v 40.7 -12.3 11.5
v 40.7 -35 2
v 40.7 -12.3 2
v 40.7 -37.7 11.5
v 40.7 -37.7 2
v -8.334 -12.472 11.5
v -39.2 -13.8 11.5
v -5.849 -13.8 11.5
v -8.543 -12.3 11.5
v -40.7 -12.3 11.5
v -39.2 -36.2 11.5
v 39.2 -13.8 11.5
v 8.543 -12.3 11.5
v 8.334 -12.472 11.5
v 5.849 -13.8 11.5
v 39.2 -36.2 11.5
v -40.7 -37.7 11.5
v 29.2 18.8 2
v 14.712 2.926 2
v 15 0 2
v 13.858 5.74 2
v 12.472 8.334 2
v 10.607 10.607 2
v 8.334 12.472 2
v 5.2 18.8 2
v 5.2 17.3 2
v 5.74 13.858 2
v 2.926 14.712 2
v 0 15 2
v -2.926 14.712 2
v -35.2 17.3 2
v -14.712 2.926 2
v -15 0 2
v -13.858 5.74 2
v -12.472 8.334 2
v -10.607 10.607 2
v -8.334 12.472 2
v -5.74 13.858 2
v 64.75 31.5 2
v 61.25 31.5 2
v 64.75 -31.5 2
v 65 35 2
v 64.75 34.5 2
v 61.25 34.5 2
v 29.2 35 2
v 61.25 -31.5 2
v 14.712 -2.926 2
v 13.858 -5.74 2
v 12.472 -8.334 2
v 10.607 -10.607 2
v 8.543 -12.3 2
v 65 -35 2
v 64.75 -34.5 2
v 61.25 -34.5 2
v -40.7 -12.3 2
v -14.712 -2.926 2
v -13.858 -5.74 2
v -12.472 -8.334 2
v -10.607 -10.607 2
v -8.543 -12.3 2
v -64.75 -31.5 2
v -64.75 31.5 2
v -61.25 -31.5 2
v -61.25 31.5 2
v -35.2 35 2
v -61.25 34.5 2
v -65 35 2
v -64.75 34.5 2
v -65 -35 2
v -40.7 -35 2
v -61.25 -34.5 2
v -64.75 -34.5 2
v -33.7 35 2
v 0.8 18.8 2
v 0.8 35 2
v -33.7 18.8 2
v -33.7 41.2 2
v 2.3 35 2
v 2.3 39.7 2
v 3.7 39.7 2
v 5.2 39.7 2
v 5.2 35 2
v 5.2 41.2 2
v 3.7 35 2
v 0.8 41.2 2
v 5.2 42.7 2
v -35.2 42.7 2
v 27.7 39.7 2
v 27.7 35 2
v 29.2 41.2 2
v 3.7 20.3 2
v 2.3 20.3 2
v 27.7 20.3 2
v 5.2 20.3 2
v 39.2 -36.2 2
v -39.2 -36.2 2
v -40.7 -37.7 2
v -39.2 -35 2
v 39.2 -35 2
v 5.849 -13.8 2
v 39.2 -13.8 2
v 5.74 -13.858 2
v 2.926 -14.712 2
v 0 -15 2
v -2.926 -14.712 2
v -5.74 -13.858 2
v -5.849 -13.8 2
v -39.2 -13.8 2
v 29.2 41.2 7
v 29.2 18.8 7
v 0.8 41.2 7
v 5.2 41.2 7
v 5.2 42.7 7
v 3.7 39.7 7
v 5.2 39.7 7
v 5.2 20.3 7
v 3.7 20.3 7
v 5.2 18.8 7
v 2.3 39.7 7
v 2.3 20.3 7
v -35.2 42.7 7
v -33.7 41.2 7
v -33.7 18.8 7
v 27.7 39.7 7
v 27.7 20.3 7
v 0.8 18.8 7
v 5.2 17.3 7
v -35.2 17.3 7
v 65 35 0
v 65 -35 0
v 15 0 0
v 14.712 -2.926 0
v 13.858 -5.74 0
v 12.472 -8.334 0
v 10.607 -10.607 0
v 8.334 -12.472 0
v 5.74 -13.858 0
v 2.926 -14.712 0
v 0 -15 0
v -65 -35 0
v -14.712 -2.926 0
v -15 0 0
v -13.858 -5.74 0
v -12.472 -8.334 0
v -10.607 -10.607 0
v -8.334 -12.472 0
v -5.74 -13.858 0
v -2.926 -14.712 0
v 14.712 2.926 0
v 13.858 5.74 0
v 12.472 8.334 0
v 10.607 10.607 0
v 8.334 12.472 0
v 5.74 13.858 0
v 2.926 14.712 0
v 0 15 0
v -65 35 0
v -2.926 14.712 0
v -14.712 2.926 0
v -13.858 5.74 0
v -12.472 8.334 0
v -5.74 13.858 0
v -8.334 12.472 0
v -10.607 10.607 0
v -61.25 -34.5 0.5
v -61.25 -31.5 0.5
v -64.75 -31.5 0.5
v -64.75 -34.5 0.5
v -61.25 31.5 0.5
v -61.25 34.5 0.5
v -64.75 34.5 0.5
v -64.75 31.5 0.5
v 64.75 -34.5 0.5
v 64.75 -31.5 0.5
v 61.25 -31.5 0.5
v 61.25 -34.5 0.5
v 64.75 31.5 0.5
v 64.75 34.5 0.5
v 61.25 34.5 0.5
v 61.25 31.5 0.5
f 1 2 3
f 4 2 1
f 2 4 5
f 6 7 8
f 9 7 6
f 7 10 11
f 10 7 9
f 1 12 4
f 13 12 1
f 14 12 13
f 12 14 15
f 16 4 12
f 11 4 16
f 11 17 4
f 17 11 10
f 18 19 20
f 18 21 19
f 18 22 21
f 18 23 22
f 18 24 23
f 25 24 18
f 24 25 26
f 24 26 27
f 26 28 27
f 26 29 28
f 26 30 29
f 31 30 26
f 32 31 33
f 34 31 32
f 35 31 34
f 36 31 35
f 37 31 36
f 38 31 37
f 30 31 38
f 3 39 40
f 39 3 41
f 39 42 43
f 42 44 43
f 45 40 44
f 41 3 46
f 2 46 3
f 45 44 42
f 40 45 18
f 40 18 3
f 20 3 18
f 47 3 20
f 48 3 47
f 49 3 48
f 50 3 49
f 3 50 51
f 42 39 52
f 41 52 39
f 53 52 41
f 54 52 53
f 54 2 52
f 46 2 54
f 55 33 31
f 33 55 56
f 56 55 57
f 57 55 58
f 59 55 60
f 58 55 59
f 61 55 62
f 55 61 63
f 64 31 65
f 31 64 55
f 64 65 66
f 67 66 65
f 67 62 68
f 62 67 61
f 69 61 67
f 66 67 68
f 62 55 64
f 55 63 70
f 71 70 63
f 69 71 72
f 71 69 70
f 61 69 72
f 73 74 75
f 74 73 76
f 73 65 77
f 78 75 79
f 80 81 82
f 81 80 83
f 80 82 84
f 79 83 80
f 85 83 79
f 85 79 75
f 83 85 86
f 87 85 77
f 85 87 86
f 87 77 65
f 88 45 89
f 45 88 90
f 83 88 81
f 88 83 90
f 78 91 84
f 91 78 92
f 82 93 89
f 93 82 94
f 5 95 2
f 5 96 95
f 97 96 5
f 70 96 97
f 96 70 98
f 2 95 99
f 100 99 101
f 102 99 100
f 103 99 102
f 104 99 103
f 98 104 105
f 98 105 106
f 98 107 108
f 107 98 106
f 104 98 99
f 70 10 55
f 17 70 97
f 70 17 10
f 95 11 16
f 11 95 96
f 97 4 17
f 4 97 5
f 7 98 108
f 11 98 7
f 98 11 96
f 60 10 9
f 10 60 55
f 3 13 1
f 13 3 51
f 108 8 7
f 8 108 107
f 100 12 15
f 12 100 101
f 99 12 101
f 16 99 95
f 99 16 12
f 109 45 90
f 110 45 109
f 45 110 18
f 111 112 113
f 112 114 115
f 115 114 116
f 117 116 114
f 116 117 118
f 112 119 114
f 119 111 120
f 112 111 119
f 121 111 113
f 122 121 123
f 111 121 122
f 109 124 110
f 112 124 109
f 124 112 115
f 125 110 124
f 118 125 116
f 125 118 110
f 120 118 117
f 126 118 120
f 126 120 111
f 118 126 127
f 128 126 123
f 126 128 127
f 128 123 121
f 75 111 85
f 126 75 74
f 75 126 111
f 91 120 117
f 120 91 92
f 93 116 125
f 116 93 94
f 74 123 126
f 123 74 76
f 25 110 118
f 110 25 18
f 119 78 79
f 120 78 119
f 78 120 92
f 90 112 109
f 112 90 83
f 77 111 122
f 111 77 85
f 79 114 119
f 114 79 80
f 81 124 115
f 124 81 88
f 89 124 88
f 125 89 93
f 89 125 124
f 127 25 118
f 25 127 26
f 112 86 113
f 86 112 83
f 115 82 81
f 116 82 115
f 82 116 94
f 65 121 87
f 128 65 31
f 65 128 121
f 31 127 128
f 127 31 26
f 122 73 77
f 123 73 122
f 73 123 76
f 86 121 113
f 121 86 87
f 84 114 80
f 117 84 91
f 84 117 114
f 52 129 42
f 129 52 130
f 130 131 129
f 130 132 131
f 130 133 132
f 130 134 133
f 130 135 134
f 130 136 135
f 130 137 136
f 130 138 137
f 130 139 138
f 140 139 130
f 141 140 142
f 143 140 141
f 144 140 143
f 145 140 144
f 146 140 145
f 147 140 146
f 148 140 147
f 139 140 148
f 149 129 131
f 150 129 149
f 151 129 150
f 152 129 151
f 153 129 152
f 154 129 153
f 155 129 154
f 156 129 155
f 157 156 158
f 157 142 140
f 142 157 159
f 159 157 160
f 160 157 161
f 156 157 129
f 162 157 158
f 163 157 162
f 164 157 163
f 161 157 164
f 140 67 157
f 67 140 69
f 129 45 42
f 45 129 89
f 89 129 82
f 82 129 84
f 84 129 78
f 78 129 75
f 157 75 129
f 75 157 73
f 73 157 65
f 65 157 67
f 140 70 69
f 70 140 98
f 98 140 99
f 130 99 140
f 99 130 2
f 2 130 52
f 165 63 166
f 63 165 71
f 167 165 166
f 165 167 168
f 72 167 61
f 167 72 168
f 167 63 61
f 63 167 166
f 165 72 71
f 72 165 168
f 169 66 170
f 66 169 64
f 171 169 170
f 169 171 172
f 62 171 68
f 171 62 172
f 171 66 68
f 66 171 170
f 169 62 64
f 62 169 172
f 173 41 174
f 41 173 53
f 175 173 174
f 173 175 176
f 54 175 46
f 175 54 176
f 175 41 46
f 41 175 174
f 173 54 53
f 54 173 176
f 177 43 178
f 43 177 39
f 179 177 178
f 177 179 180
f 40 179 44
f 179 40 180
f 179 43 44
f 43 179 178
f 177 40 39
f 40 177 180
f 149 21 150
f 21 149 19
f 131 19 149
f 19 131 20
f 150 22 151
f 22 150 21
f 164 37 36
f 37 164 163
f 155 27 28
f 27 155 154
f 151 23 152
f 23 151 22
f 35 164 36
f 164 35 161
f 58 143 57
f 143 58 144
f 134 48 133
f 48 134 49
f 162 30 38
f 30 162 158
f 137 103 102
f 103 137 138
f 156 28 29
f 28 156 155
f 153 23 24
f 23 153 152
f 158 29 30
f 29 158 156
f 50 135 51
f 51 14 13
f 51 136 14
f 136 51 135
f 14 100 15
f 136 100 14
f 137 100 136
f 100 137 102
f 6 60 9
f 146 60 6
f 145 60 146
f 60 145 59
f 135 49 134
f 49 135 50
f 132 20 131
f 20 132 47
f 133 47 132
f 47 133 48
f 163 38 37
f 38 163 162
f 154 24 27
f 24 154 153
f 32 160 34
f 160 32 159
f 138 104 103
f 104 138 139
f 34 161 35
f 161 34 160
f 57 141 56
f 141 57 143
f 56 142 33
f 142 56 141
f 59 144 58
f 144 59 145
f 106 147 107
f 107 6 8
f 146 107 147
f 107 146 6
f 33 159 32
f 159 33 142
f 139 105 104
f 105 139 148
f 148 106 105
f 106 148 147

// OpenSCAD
// ==========================================
// Xentient Interior — Zone A Tray (Battery + Power)
// Slides onto rail guides at Z=3
// ==========================================
// Print count: 1
// Mount: slides into rail guide channels at Z=3, or glue directly to floor
// Per Framework §7: battery cradle + power module clips
// Units: mm

$fn = 32;

// Battery holder (18650 single cell)
BH_L       = 78.0;
BH_W       = 22.0;
BH_H       = 19.0;
BH_Clear   = 0.2;

// Power modules
TP4056_L   = 25.0;  TP4056_W = 19.0;  TP4056_H = 10.0;
MT3608_L   = 37.0;  MT3608_W = 22.0;  MT3608_H = 10.0;
LDO_L      = 12.0;  LDO_W    = 8.0;   LDO_H    = 5.0;
Clip_T     = 1.5;    Clip_Clear = 0.2;

// Tray plate
Tray_T     = 2.0;    // Plate thickness
Wire_Chimney_D = 30.0; // Central wire routing cutout

// Rail slot engagement (slides between rail guide strips)
Slot_W     = 3.5;    // Matches rail guide channel width
Slot_Engage = 2.0;   // How deep the tray edge engages the rail

module zone_a_tray() {
    difference() {
        // Hex-shaped floor plate (fits inside hex at Z=3, F2F≈142mm)
        // Simplified: rectangular with wire chimney
        // Battery cradle centered at Y=-25, power modules near Y=+30
        union() {
            // Main plate (sized to fit hex at Z=3)
            translate([0, 0, Tray_T/2])
                cube([130, 70, Tray_T], center=true);

            // Battery retaining walls
            pL = BH_L + 2*BH_Clear;
            pW = BH_W + 2*BH_Clear;
            translate([0, -25, BH_H/4 + Tray_T])
                for (s = [-1, 1]) {
                    // Y-axis lips
                    translate([0, s * (pW/2 + Clip_T/2), 0])
                        cube([pL + 2*Clip_T, Clip_T, BH_H/2], center=true);
                    // X-axis lips
                    translate([s * (pL/2 + Clip_T/2), 0, 0])
                        cube([Clip_T, pW + 2*Clip_T, BH_H/2], center=true);
                }

            // TP4056 clip
            translate([15, 30, TP4056_H/4 + Tray_T])
                for (s = [-1, 1]) {
                    translate([0, s * (TP4056_W/2 + Clip_Clear + Clip_T/2), 0])
                        cube([TP4056_L + 2*Clip_Clear + 2*Clip_T, Clip_T, TP4056_H/2], center=true);
                    translate([s * (TP4056_L/2 + Clip_Clear + Clip_T/2), 0, 0])
                        cube([Clip_T, TP4056_W + 2*Clip_Clear + 2*Clip_T, TP4056_H/2], center=true);
                }

            // MT3608 clip
            translate([-15, 30, MT3608_H/4 + Tray_T])
                for (s = [-1, 1]) {
                    translate([0, s * (MT3608_W/2 + Clip_Clear + Clip_T/2), 0])
                        cube([MT3608_L + 2*Clip_Clear + 2*Clip_T, Clip_T, MT3608_H/2], center=true);
                    translate([s * (MT3608_L/2 + Clip_Clear + Clip_T/2), 0, 0])
                        cube([Clip_T, MT3608_W + 2*Clip_Clear + 2*Clip_T, MT3608_H/2], center=true);
                }
        }

        // Wire chimney (central cutout)
        translate([0, 0, -1])
            cylinder(h=Tray_T + 20, d=Wire_Chimney_D, $fn=32);

        // Rail engagement notches (4 corners of plate, for rail guides)
        for (sx = [-1, 1], sy = [-1, 1]) {
            translate([sx * 63, sy * 33, Tray_T])
                cube([Slot_W, 3.0, Slot_Engage + 1], center=true);
        }
    }
}

// Render
zone_a_tray();
